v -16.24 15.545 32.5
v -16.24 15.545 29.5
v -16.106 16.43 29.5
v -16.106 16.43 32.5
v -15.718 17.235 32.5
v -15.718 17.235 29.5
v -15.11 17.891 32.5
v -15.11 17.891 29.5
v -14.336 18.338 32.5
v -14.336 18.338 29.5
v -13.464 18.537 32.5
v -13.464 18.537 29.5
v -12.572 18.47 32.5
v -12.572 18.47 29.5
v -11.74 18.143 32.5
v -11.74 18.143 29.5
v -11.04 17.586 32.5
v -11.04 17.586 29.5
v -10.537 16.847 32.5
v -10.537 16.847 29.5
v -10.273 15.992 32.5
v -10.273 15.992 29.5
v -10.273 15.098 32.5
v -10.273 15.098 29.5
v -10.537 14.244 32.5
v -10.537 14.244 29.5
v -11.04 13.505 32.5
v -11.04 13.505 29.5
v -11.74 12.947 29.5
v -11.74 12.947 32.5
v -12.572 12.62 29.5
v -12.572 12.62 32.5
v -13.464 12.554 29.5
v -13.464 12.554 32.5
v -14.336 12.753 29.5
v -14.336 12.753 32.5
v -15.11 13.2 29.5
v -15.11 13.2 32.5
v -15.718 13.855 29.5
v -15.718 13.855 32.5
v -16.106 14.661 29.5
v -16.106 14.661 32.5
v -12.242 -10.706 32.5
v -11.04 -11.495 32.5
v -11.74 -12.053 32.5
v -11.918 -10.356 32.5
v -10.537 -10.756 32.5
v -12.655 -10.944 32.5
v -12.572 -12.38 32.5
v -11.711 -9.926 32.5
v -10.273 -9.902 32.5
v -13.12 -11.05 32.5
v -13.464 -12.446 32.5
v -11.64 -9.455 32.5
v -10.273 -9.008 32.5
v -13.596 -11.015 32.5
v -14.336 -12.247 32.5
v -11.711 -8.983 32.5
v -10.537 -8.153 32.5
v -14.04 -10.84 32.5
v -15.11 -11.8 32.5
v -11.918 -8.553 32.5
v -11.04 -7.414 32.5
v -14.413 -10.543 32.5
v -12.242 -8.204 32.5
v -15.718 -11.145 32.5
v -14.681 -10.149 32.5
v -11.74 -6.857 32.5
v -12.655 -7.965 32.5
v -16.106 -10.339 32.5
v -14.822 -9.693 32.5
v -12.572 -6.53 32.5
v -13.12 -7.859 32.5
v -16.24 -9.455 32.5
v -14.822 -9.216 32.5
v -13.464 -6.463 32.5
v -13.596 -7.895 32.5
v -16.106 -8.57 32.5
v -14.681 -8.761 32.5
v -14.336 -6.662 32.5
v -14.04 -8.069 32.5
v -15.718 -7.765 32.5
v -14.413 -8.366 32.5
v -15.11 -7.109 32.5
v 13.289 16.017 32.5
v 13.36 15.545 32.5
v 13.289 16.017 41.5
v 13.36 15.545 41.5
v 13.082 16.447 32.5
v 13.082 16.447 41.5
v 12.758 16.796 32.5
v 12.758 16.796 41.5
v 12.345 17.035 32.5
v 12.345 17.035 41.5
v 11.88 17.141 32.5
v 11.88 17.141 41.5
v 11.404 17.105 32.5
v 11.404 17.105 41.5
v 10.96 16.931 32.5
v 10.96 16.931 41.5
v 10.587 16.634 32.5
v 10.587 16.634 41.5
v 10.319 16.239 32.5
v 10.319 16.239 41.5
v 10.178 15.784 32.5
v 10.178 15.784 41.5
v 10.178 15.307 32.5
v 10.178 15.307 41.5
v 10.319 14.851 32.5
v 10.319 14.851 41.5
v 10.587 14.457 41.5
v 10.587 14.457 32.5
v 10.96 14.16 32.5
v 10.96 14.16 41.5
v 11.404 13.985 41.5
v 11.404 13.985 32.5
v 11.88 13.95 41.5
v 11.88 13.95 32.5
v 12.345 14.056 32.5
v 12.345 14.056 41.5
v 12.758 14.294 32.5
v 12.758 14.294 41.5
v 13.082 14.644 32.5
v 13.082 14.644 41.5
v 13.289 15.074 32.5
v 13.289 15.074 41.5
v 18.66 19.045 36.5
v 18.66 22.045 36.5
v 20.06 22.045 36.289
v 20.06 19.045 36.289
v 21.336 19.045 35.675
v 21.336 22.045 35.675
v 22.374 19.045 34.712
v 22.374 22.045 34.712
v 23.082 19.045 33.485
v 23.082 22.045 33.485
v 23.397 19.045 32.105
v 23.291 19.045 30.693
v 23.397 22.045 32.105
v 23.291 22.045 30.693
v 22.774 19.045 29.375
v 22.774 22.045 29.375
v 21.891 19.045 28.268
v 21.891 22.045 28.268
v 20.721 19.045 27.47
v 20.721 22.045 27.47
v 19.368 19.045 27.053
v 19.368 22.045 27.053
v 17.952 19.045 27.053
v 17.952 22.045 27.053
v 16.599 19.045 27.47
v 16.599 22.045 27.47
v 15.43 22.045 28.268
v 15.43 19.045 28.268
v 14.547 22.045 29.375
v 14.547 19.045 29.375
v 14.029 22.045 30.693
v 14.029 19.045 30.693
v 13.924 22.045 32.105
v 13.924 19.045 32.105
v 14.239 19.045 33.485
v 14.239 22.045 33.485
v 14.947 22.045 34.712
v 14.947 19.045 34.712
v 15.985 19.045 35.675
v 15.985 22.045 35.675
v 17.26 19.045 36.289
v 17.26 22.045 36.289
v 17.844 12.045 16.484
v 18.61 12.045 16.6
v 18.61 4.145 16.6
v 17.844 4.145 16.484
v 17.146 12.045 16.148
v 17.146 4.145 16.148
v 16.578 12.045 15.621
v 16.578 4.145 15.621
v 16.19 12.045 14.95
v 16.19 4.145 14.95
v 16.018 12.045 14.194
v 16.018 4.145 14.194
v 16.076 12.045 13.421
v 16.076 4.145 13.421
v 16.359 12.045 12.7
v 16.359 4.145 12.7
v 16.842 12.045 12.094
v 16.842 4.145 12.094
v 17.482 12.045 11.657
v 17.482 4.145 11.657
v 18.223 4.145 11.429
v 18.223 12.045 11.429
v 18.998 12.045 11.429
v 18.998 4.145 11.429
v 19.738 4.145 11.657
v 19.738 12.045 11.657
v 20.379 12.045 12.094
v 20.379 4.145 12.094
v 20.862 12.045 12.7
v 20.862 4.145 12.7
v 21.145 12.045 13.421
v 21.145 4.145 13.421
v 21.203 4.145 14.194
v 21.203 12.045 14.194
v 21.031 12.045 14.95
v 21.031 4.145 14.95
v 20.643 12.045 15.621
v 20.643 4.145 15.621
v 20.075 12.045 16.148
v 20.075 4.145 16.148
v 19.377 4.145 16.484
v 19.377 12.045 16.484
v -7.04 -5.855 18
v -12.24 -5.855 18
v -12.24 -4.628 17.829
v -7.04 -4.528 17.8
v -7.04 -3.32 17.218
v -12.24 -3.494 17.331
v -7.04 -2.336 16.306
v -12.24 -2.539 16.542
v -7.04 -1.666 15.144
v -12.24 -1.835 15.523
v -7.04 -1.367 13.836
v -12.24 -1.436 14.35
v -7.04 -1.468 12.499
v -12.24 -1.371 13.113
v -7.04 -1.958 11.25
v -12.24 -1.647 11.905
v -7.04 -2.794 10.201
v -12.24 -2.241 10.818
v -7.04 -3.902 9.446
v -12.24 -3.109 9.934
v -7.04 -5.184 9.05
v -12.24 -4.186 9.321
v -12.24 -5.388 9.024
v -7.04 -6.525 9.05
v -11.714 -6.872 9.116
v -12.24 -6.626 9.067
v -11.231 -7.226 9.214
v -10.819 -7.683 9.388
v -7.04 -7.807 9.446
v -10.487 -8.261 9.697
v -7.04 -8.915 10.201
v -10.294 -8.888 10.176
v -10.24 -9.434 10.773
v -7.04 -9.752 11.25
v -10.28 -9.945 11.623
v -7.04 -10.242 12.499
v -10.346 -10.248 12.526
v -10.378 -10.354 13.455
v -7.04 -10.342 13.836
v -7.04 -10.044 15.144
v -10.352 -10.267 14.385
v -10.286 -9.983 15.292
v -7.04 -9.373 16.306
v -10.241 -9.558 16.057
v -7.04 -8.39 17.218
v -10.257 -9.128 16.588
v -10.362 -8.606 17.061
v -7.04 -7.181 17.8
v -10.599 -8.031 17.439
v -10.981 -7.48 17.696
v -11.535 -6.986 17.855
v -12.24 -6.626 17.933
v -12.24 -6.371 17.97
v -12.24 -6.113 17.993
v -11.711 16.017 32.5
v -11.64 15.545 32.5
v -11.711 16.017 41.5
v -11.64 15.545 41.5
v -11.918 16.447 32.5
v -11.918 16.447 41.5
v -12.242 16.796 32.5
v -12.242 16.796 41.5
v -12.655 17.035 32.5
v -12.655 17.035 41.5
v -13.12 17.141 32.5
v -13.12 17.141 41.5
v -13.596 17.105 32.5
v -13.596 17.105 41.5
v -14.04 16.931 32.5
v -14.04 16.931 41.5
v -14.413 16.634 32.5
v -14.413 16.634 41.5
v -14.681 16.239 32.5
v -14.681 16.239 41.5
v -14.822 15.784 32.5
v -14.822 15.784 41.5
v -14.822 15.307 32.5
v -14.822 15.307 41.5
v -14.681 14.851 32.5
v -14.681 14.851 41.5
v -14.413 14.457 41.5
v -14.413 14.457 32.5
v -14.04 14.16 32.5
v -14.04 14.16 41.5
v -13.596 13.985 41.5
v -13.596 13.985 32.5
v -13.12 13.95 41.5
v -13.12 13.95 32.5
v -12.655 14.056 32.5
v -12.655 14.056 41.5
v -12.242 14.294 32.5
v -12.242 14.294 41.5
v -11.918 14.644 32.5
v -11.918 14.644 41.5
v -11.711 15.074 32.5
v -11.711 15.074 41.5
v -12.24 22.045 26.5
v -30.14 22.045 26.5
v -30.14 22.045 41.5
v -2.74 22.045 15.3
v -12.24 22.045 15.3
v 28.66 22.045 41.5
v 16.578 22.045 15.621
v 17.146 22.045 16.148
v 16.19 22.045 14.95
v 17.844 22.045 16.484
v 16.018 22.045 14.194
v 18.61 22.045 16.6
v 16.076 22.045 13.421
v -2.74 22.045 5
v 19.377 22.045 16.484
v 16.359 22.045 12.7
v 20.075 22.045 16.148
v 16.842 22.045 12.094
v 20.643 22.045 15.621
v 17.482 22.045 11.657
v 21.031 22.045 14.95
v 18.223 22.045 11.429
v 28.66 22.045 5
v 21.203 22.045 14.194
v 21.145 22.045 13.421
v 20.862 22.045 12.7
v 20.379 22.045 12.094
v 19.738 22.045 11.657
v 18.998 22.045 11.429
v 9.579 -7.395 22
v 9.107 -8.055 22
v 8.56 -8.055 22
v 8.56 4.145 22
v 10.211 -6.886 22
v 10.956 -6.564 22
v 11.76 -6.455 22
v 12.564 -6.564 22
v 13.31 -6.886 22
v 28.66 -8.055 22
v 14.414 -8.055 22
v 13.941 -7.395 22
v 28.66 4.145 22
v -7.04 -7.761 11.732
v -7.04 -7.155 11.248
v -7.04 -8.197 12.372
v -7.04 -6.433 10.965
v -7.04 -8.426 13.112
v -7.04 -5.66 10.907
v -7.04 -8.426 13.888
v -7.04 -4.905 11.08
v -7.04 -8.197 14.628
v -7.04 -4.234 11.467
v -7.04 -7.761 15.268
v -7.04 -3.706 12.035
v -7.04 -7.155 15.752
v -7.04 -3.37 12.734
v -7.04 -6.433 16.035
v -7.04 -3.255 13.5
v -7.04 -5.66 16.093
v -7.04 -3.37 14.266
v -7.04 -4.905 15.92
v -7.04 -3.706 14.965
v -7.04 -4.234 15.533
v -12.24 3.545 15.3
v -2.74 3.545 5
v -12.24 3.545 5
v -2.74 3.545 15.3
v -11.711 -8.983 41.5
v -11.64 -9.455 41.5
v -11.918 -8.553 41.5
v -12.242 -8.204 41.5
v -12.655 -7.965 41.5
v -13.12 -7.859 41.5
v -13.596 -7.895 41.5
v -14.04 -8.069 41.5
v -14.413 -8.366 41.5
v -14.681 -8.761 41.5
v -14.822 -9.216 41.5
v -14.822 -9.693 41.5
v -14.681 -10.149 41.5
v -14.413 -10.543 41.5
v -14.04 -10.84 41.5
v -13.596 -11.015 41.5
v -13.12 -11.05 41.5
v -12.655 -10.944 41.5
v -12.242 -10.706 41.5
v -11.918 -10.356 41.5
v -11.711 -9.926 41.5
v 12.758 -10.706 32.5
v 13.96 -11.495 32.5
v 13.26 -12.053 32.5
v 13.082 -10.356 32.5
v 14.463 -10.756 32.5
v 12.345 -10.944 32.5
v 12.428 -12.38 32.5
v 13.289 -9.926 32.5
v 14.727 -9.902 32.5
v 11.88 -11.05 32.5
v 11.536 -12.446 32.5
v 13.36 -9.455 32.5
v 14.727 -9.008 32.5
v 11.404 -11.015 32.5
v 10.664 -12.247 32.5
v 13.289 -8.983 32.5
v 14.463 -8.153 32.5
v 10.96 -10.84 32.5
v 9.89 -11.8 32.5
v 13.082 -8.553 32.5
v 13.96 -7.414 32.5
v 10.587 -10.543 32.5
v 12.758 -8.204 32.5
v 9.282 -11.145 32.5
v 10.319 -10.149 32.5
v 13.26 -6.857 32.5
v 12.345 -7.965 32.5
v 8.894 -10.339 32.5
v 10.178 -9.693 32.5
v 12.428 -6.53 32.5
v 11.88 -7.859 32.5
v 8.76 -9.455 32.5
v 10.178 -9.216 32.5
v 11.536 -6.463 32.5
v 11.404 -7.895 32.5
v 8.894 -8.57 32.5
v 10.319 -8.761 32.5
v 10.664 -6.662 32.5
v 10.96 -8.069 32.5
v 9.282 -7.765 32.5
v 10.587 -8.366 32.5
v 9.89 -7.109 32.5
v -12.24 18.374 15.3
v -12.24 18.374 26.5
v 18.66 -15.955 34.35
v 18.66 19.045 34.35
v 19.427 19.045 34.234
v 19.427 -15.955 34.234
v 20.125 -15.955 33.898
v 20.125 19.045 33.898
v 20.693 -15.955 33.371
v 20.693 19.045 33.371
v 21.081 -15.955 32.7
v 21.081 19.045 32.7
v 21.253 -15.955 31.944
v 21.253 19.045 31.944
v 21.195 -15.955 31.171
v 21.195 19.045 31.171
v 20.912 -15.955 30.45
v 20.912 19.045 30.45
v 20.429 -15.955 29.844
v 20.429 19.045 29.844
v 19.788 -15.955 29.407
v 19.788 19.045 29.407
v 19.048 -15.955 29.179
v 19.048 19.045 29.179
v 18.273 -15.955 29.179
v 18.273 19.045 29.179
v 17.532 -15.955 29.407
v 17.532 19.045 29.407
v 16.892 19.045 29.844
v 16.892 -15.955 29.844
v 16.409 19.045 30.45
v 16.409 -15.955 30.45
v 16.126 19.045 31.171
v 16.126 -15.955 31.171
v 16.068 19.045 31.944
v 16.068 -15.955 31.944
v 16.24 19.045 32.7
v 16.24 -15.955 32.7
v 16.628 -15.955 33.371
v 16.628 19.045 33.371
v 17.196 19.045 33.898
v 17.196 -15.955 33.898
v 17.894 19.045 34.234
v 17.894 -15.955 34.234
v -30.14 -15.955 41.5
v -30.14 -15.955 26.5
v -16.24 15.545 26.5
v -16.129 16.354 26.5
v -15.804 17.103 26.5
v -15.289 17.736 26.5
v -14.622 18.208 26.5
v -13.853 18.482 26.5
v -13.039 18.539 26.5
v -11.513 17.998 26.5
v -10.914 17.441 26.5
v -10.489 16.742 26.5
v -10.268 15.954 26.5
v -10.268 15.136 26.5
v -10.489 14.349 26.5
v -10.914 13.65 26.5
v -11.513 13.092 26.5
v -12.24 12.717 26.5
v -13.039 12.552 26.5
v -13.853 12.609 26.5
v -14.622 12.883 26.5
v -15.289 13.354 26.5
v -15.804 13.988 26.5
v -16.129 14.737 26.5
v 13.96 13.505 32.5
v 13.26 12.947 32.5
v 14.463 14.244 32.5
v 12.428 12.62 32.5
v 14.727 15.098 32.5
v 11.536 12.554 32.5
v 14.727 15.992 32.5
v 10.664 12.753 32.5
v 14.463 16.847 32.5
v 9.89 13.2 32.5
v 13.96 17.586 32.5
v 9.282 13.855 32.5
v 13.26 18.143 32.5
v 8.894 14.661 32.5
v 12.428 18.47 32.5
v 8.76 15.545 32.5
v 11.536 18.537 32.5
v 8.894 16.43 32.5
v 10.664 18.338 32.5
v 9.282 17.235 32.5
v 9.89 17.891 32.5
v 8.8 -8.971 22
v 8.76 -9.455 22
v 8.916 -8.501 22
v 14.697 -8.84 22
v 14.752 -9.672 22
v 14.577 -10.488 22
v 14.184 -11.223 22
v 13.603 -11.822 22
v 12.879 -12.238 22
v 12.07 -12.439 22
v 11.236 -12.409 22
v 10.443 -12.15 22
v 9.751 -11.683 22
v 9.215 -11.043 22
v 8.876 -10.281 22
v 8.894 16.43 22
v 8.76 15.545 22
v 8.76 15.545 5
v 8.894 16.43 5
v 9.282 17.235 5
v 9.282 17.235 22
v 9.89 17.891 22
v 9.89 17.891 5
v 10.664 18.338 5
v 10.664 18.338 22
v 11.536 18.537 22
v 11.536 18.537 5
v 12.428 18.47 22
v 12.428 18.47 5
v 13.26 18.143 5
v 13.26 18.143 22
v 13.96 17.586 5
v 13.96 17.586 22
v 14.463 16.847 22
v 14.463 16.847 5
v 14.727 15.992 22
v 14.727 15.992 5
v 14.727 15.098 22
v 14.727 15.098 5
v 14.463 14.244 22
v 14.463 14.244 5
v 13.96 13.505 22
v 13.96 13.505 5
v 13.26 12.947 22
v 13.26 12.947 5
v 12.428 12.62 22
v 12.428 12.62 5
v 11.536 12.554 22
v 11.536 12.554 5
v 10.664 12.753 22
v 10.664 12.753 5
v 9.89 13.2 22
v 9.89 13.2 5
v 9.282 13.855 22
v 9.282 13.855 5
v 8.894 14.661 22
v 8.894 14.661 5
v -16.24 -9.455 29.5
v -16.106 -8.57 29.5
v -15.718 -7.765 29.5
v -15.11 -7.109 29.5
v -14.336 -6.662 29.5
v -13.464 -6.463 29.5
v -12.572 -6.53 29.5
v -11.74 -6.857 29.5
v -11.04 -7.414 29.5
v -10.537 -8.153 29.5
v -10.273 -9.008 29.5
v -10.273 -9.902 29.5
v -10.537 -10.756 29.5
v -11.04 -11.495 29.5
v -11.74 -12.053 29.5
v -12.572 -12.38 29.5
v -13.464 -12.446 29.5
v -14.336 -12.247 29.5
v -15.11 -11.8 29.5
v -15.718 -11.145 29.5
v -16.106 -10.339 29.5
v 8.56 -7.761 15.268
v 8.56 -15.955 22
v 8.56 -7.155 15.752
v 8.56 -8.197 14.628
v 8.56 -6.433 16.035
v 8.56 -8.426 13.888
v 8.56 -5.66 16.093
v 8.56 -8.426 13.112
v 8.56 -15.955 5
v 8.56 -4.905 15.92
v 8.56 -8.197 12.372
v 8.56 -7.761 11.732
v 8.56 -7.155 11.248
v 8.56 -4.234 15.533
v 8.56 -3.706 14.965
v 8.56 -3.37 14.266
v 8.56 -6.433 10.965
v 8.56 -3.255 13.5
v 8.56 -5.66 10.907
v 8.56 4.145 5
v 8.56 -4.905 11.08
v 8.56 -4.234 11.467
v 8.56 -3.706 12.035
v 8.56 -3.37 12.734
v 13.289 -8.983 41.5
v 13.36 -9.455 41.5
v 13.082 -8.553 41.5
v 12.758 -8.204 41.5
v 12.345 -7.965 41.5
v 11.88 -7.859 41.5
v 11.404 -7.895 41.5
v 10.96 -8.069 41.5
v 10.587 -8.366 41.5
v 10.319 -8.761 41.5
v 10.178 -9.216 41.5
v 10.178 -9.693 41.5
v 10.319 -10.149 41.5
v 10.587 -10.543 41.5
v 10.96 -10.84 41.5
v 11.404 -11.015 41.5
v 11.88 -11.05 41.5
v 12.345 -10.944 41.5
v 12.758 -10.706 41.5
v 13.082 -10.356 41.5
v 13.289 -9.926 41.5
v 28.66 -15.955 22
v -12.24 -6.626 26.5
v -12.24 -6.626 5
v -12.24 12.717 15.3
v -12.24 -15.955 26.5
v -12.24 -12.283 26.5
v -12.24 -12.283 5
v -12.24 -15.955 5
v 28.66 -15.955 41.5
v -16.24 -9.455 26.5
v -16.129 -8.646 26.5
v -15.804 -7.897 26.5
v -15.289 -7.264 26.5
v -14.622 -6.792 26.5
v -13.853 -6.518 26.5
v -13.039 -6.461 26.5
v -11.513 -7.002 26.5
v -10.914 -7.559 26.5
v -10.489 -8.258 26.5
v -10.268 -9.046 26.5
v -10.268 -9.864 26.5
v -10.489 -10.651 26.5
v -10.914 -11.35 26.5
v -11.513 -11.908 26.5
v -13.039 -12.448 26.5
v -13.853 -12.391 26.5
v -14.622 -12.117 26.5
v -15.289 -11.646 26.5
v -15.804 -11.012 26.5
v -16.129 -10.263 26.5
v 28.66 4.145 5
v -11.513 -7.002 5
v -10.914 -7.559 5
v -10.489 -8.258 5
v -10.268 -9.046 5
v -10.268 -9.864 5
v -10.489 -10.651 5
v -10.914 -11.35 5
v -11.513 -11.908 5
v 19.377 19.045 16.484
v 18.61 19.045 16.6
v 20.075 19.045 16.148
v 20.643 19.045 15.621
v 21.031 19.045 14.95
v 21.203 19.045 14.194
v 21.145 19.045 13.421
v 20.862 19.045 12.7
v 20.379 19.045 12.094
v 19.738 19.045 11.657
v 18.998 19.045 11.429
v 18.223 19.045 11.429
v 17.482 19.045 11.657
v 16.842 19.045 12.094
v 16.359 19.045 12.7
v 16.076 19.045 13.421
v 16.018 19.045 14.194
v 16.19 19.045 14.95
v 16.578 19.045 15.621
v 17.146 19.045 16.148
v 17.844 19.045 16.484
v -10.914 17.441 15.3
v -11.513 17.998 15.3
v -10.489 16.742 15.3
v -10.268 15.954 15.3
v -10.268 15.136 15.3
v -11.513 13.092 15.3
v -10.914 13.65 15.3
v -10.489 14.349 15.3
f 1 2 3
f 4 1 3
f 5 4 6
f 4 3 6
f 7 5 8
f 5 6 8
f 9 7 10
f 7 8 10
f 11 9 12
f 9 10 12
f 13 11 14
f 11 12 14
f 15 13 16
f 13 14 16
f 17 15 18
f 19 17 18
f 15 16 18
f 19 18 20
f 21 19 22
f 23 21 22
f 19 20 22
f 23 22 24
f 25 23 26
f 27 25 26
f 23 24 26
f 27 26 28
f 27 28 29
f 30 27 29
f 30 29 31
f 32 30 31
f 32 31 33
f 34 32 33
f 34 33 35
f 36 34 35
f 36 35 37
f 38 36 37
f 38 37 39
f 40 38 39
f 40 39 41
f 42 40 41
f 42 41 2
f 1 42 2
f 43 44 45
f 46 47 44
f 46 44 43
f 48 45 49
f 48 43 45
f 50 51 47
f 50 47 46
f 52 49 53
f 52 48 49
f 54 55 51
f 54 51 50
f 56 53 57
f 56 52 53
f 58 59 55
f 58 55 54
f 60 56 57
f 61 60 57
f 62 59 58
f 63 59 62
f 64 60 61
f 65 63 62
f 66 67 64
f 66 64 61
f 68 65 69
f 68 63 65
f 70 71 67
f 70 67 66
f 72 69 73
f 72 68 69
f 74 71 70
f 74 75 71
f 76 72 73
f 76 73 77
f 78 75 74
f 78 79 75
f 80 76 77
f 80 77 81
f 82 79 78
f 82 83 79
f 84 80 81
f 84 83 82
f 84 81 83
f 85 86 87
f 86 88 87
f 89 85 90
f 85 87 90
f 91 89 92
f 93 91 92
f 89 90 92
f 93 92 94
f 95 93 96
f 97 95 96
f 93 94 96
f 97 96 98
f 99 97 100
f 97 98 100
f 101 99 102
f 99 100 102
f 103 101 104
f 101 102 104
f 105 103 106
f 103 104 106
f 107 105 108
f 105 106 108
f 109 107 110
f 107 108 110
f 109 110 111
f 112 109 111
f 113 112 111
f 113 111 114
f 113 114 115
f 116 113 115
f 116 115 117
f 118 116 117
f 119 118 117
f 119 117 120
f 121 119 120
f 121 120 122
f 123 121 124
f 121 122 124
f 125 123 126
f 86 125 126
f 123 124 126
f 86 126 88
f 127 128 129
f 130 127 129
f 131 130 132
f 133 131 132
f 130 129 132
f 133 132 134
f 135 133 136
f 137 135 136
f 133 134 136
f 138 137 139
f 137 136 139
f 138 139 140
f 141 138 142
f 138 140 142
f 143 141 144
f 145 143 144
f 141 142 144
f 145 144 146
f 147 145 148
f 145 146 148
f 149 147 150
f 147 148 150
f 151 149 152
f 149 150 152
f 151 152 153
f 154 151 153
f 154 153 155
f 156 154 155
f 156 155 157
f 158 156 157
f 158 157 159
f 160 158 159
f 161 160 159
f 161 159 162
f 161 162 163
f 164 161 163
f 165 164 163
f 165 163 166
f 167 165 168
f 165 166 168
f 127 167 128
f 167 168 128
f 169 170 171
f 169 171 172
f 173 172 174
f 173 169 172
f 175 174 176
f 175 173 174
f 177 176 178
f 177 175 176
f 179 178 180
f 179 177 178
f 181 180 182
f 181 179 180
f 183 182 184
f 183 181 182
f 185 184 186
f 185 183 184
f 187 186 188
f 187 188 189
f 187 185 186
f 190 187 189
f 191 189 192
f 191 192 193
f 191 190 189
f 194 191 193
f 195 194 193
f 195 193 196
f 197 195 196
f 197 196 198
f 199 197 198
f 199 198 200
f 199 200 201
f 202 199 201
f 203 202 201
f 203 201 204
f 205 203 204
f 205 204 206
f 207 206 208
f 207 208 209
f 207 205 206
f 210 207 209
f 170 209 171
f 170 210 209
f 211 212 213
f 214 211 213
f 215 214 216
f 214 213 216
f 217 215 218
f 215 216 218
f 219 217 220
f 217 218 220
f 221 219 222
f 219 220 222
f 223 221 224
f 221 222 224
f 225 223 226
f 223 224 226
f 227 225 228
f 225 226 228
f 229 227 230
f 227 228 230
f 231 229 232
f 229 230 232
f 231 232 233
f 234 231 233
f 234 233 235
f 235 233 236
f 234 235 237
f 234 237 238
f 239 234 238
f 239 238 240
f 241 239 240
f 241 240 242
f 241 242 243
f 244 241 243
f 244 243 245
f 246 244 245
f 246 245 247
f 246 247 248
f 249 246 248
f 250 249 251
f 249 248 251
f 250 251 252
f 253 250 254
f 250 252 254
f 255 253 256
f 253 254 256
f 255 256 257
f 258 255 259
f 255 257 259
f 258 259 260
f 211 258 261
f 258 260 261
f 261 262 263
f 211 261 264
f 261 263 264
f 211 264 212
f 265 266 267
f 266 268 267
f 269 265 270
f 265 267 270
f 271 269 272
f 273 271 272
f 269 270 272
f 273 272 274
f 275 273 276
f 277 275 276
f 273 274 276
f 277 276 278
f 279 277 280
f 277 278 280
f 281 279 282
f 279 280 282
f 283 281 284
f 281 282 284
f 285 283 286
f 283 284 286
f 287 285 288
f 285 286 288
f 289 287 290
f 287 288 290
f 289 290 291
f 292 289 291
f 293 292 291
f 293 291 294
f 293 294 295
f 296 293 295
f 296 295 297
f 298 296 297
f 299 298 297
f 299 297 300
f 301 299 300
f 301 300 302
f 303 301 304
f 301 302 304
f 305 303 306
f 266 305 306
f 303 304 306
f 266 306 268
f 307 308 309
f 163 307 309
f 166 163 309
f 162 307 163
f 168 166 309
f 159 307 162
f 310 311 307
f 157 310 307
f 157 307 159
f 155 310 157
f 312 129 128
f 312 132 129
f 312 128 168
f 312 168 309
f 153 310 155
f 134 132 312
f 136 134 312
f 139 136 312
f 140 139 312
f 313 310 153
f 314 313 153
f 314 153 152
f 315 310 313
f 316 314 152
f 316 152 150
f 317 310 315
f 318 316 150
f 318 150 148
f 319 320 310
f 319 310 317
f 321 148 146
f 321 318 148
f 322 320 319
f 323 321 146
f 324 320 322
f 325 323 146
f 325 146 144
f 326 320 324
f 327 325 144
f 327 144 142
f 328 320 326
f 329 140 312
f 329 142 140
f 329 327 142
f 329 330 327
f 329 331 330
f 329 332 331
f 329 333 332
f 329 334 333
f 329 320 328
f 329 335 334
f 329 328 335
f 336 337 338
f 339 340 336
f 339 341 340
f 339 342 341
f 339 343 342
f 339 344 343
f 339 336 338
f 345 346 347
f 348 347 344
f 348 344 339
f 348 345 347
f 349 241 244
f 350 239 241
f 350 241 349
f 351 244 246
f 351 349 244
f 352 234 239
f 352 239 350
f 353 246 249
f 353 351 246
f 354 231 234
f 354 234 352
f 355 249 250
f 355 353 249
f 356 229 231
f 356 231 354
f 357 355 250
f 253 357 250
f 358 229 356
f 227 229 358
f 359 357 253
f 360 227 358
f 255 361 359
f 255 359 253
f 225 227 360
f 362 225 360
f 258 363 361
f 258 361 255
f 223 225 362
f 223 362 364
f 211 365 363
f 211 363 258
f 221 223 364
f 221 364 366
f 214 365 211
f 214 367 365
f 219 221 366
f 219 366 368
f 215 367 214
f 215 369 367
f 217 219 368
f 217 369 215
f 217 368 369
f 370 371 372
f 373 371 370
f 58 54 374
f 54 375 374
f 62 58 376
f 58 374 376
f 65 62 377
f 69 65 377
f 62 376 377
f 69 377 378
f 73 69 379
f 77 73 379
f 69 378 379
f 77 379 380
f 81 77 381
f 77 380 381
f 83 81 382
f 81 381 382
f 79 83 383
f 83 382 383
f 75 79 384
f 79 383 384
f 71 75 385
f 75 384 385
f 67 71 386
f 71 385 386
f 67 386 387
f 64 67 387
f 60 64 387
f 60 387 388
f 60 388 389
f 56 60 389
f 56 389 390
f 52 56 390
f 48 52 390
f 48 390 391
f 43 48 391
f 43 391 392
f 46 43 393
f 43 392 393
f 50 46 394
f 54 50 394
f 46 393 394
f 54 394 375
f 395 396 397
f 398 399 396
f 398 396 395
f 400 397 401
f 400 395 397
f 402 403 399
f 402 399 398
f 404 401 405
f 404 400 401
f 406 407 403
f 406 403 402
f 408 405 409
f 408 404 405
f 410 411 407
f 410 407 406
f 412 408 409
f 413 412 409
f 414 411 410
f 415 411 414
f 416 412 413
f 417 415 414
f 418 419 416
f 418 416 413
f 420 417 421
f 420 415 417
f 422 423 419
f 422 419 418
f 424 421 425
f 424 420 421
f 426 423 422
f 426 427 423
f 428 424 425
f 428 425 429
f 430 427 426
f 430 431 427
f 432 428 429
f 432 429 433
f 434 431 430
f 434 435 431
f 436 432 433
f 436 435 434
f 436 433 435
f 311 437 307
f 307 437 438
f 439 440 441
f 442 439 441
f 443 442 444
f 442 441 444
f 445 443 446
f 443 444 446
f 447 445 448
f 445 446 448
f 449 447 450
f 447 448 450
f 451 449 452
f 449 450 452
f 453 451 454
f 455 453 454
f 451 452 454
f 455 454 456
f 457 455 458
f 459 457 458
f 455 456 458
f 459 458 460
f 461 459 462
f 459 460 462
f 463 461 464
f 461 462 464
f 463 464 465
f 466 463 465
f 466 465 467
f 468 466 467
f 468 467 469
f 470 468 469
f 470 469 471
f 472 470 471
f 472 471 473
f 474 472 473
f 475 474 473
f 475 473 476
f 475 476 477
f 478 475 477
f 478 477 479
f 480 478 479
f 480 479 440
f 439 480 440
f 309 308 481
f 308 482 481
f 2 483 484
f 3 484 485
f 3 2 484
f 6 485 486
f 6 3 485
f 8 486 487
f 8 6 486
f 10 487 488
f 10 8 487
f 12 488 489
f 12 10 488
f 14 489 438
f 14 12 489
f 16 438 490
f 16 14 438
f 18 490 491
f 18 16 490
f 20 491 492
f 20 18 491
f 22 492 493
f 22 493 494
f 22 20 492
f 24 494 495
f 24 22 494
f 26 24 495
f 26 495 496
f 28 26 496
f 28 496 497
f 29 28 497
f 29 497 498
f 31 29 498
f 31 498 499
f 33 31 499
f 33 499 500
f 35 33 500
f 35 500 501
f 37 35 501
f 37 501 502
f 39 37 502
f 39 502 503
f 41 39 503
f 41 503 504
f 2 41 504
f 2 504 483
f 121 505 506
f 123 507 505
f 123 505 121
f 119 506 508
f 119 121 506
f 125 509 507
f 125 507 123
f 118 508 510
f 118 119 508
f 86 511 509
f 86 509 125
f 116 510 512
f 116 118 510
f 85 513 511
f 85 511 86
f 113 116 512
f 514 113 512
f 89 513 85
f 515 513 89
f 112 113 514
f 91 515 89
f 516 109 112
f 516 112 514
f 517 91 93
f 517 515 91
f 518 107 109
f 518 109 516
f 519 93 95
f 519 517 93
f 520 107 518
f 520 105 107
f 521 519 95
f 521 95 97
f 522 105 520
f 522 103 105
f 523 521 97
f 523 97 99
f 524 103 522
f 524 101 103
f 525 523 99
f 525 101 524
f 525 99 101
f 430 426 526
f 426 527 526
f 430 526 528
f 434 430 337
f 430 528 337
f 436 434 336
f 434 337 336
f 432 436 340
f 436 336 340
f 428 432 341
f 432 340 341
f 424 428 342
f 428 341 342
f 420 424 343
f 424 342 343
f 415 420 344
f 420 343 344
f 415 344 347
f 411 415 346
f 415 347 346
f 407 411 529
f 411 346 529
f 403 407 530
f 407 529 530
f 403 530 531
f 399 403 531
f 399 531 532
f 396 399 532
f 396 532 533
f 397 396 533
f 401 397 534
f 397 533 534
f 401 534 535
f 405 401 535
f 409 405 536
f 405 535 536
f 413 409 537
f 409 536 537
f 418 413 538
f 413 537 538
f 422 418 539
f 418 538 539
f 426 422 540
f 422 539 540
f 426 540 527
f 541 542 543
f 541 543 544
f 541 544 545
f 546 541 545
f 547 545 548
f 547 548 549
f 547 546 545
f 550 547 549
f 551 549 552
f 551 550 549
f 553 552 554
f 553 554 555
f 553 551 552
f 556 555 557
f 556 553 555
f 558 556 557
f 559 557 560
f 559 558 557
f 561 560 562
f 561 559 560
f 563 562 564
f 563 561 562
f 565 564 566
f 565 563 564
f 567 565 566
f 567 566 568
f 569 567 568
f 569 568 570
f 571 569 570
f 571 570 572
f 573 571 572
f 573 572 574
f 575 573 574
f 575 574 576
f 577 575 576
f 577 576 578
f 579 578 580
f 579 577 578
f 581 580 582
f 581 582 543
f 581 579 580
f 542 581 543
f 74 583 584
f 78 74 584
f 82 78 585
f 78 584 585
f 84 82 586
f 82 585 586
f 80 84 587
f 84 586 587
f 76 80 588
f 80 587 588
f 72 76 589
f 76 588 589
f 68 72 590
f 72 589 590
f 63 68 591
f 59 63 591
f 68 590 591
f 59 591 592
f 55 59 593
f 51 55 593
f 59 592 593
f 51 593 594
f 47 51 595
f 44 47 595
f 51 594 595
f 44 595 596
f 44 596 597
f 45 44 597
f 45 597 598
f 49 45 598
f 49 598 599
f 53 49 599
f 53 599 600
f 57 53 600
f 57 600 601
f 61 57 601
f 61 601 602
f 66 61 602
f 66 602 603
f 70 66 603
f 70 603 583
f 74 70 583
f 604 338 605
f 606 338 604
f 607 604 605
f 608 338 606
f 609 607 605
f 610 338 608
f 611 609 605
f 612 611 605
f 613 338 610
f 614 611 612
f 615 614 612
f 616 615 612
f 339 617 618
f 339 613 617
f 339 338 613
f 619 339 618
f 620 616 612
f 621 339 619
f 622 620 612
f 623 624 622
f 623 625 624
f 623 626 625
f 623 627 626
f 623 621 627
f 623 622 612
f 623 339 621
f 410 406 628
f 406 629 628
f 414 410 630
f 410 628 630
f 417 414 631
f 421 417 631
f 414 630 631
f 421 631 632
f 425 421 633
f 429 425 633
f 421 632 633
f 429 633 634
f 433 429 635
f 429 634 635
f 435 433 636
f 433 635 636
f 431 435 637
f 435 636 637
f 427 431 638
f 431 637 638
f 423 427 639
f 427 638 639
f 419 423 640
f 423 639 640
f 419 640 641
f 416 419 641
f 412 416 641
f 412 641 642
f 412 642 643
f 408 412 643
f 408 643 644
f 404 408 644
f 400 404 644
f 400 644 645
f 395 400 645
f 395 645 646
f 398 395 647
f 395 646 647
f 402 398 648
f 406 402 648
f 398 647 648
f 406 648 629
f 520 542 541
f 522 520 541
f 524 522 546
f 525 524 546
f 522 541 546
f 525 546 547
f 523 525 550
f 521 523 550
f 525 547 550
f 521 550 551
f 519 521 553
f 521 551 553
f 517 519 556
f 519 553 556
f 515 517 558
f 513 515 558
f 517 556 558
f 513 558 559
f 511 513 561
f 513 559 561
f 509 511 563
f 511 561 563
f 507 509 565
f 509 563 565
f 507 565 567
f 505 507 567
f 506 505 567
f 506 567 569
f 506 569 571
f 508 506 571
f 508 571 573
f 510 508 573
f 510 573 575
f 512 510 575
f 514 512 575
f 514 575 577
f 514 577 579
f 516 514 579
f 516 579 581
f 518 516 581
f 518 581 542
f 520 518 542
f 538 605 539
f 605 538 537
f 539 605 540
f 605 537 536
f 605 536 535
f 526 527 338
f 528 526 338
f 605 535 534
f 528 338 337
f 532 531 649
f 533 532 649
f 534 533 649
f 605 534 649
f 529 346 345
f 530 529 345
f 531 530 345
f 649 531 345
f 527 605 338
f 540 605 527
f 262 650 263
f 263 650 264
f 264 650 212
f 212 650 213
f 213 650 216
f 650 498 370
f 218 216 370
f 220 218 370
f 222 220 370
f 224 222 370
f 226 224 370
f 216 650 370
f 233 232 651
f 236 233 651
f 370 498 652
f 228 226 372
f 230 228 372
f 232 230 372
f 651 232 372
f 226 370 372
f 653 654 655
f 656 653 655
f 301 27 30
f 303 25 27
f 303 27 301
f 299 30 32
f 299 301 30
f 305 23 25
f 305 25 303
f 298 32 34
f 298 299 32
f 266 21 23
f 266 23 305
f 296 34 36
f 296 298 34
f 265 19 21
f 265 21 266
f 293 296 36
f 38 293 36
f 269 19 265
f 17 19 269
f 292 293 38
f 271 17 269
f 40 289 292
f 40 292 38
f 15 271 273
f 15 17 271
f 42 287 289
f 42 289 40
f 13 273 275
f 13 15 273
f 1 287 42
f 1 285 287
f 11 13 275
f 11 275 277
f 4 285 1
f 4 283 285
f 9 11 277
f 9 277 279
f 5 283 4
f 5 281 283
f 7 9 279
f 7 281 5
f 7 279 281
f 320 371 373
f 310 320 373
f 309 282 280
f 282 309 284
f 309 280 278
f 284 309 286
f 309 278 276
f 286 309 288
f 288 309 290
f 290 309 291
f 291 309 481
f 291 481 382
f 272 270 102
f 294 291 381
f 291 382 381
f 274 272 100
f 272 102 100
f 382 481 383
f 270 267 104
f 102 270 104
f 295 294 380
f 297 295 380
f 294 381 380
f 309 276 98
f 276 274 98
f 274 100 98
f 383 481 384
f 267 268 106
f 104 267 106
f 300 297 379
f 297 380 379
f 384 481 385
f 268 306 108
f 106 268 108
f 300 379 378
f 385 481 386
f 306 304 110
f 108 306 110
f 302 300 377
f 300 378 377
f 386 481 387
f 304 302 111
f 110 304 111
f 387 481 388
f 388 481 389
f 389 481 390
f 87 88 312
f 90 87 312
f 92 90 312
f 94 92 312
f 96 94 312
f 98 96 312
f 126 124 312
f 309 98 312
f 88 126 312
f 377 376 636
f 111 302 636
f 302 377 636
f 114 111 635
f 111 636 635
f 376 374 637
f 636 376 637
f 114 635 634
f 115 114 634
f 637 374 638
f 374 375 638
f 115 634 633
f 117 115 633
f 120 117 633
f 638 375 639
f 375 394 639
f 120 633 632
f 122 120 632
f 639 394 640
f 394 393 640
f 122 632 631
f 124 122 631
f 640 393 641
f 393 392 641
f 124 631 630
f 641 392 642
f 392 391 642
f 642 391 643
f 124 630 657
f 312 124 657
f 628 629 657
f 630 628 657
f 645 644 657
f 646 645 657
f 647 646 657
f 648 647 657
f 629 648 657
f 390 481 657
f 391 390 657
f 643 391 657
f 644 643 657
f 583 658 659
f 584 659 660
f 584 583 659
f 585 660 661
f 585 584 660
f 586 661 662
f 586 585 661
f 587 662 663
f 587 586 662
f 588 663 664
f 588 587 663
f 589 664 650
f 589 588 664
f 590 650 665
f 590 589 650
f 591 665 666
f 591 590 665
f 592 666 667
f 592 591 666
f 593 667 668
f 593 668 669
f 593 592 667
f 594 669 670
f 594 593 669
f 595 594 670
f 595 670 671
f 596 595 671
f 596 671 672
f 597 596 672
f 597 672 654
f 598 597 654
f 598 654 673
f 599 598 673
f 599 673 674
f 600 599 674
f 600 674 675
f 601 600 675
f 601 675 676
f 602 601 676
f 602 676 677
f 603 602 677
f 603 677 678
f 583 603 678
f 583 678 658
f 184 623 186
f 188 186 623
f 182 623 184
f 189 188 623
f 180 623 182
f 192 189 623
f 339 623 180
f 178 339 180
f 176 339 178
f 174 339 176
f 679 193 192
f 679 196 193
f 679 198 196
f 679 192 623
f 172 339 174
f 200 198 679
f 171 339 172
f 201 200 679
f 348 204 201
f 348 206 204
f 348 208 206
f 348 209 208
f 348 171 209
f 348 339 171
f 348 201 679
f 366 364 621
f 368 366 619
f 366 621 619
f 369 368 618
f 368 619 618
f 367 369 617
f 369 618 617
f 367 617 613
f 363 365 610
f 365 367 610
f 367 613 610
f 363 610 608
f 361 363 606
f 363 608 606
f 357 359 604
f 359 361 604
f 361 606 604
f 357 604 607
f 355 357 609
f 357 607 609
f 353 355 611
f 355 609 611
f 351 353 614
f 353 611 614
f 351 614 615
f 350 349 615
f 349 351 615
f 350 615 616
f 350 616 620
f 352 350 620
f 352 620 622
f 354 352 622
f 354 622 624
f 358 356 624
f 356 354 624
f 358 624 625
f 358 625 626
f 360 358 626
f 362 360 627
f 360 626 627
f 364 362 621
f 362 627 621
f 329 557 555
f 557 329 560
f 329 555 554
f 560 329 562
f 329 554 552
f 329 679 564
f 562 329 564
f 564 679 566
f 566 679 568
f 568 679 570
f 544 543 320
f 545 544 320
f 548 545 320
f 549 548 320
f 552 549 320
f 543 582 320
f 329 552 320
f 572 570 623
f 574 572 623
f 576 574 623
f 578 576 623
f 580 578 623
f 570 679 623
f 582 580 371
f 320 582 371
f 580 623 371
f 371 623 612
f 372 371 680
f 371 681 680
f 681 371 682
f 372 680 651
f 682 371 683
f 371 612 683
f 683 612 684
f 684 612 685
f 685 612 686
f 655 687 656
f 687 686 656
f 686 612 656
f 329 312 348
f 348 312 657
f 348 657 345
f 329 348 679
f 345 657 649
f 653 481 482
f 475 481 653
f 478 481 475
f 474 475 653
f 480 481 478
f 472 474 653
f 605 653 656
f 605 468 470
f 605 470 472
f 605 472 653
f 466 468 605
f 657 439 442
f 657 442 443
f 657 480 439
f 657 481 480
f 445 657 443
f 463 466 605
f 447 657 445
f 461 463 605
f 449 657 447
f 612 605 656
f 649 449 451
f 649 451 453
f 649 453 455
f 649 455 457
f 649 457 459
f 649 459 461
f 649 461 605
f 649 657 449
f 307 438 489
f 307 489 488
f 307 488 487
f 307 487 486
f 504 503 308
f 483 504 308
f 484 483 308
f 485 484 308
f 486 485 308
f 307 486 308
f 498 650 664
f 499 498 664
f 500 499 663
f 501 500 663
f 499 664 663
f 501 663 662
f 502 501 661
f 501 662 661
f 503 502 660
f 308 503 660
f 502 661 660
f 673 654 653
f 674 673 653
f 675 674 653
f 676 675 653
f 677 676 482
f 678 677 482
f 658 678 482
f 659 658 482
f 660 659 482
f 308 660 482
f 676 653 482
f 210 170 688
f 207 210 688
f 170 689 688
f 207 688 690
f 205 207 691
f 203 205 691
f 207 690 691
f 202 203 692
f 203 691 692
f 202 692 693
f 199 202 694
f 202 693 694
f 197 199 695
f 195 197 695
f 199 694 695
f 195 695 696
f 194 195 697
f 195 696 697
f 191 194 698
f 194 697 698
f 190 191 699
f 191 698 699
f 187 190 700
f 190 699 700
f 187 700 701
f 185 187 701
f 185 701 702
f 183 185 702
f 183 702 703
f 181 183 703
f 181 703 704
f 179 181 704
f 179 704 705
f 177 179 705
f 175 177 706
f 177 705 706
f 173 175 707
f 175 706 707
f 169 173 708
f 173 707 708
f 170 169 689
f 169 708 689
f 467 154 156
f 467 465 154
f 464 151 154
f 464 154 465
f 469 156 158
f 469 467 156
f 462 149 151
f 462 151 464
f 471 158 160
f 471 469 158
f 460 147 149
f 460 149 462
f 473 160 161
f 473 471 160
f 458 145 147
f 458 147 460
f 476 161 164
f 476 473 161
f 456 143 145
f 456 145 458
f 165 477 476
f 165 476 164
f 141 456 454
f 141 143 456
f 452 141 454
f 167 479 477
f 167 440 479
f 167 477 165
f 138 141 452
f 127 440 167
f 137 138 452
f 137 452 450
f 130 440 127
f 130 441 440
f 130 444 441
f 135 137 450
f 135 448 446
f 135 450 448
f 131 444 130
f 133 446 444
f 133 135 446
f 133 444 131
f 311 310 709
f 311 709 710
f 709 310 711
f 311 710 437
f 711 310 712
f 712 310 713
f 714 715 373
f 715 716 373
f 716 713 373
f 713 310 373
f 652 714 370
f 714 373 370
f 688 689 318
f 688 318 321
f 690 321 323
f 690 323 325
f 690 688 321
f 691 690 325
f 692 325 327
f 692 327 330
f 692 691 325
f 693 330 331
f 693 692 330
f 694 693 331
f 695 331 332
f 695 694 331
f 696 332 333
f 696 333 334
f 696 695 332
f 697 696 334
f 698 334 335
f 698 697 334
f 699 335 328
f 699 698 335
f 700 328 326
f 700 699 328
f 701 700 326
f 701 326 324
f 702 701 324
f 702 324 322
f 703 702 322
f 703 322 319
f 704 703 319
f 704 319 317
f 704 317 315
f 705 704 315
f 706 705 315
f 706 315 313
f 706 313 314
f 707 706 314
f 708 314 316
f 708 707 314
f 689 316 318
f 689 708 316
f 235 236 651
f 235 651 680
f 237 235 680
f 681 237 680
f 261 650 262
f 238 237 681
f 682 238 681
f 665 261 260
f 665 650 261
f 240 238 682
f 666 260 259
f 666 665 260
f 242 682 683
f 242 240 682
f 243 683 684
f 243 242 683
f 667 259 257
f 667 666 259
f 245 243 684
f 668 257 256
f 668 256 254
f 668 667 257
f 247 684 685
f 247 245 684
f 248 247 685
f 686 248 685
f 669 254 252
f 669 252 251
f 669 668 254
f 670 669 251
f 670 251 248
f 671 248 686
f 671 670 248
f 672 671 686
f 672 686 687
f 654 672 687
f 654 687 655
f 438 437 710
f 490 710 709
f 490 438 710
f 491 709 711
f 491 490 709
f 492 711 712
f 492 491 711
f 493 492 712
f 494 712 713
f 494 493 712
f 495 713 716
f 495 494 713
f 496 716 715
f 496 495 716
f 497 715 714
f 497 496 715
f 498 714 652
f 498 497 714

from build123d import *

# Parameters (mm, degrees)
SKETCH_1_W                = 58.8
SKETCH_1_H                = 32
EXTRUDE_1_DEPTH           = 41.5
HOLE_WIZARD_1_D           = 3.2
HOLE_WIZARD_1_CBORE_D     = 6
HOLE_WIZARD_1_CBORE_DEPTH = 32.5
SKETCH_8_R                = 2.6
CUT_EXTRUDE_6_DEPTH       = 33.5
SKETCH_10_W               = 58.8
SKETCH_10_H               = 41.5
EXTRUDE_2_DEPTH           = 3
SKETCH_20_W               = 20
SKETCH_20_H               = 20
SKETCH_20_R               = 3
CUT_EXTRUDE_16_DEPTH      = 22
SKETCH_21_R               = 2.6
CUT_EXTRUDE_17_DEPTH      = 63.093855195
SKETCH_22_W               = 22
SKETCH_22_H               = 20
CUT_EXTRUDE_18_DEPTH      = 0.1
SKETCH_23_W               = 20.1
SKETCH_23_H               = 22
CUT_EXTRUDE_19_DEPTH      = 0.1
SKETCH_24_R               = 2.6
CUT_EXTRUDE_20_DEPTH      = 56.08771962
SKETCH_25_W               = 21.4
SKETCH_25_H               = 23.5
CUT_EXTRUDE_21_DEPTH      = 35
SKETCH_26_W               = 21.4
SKETCH_26_H               = 20
SKETCH_26_R               = 3
CUT_EXTRUDE_22_DEPTH      = 27
SKETCH_27_R               = 3
EXTRUDE_3_DEPTH           = 6
CHAMFER_1_SIZE            = 10
FILLET_1_R                = 5
CUT_EXTRUDE_30_DEPTH      = 5
SKETCH_36_R               = 2.6
CUT_EXTRUDE_31_DEPTH      = 60.855349011
SKETCH_37_R               = 2.6
EXTRUDE_6_DEPTH           = 3
SKETCH_38_W               = 19.040158201
SKETCH_38_H               = 15.764200478
CUT_EXTRUDE_32_DEPTH      = 3
SKETCH_39_W               = 5.883083502
SKETCH_39_H               = 11.158232545
CUT_EXTRUDE_33_DEPTH      = 9
SKETCH_40_W               = 9
SKETCH_40_H               = 11.158232545
CUT_EXTRUDE_34_DEPTH      = 4
CUT_EXTRUDE_35_DEPTH      = 14
CUT_EXTRUDE_37_DEPTH      = 5
CUT_EXTRUDE_38_DEPTH      = 9
SKETCH_44_W               = 27.4
SKETCH_44_H               = 35
SKETCH_44_R               = 3
EXTRUDE_7_DEPTH           = 3
SKETCH_45_R               = 1.5
CUT_EXTRUDE_39_DEPTH      = 6
SKETCH_47_R               = 1.5
CUT_EXTRUDE_41_DEPTH      = 6
SKETCH_48_R               = 2.6
CUT_EXTRUDE_42_DEPTH      = 63.093855195
SKETCH_49_R               = 2.6
EXTRUDE_8_DEPTH           = 35
SKETCH_50_W               = 20.1
SKETCH_50_H               = 17
CUT_EXTRUDE_43_DEPTH      = 7
SKETCH_51_R               = 6.4
EXTRUDE_9_DEPTH           = 5
SKETCH_52_R               = 2.6
EXTRUDE_10_DEPTH          = 6.3
SKETCH_55_W               = 20.1
SKETCH_55_H               = 7
SKETCH_55_R               = 3
EXTRUDE_11_DEPTH          = 17
SKETCH_56_R               = 2.6
CUT_EXTRUDE_46_DEPTH      = 63.093855195
SKETCH_57_W               = 20.1
SKETCH_57_H               = 17
SKETCH_57_R               = 2.6
EXTRUDE_12_DEPTH          = 7.9
SKETCH_58_W               = 20.1
SKETCH_58_H               = 17
CUT_EXTRUDE_47_DEPTH      = 7.9
SKETCH_59_R               = 1.5
EXTRUDE_13_DEPTH          = 6
SKETCH_60_R               = 1.5
EXTRUDE_14_DEPTH          = 11.3
EXTRUDE_15_DEPTH          = 9.5
SKETCH_62_R               = 2.6
CUT_EXTRUDE_48_DEPTH      = 60.855349011
SKETCH_65_R               = 4.5
SKETCH_65_R_2             = 2.6
CUT_EXTRUDE_50_DEPTH      = 5.2
SKETCH_66_R               = 3
CUT_EXTRUDE_51_DEPTH      = 42.633756235
SKETCH_67_R               = 3
CUT_EXTRUDE_52_DEPTH      = 42.633756287
SKETCH_68_R               = 2.6
EXTRUDE_16_DEPTH          = 3
SKETCH_69_R               = 4.75
CUT_EXTRUDE_53_DEPTH      = 3


with BuildPart() as part:
    # 草图1 → 凸台-拉伸1 (new body)
    with BuildSketch(Plane.XY):
        with Locations((-0.739622642, 3.045283019)):
            Rectangle(SKETCH_1_W, SKETCH_1_H)
    extrude(amount=EXTRUDE_1_DEPTH)

    # 孔1 (through all)
    with Locations(Plane(origin=(11.760377358, 15.545283019, 0), x_dir=(-1, 0, 0), z_dir=(0, 0, -1))):
        with Locations((0, 0), (25, 0), (25, -25), (0, -25)):
            CounterBoreHole(HOLE_WIZARD_1_D / 2, HOLE_WIZARD_1_CBORE_D / 2, HOLE_WIZARD_1_CBORE_DEPTH)

    # 草图8 → 切除-拉伸6 (cut)
    with BuildSketch(Plane(origin=(0, 19.045283019, 0), x_dir=(1, 0, 0), z_dir=(0, 1, 0))):
        with Locations(Location((-0.739622642, -31.5, 0), (0, 0, 270))):
            Circle(SKETCH_8_R)
    extrude(amount=-CUT_EXTRUDE_6_DEPTH, mode=Mode.SUBTRACT)

    # 草图10 → 凸台-拉伸2 (add)
    with BuildSketch(Plane.XZ.offset(12.954716981)):
        with Locations((-0.739622642, 20.75)):
            Rectangle(SKETCH_10_W, SKETCH_10_H)
    extrude(amount=EXTRUDE_2_DEPTH)

    # 草图20 → 切除-拉伸16 (cut)
    with BuildSketch(Plane(origin=(0, 0, 0), x_dir=(-1, 0, 0), z_dir=(0, 0, -1))):
        with Locations((-18.660377358, 9.045283019)):
            Rectangle(SKETCH_20_W, SKETCH_20_H)
        with Locations((-11.760377358, 15.545283019)):
            Circle(SKETCH_20_R, mode=Mode.SUBTRACT)
    extrude(amount=-CUT_EXTRUDE_16_DEPTH, mode=Mode.SUBTRACT)

    # 草图21 → 切除-拉伸17 (cut, through all)
    with BuildSketch(Plane(origin=(0, 19.045283019, 0), x_dir=(1, 0, 0), z_dir=(0, 1, 0))):
        with Locations(Location((-0.739622642, -31.5, 0), (0, 0, 270))):
            Circle(SKETCH_21_R)
    extrude(amount=-CUT_EXTRUDE_17_DEPTH, mode=Mode.SUBTRACT)

    # 草图22 → 切除-拉伸18 (cut)
    with BuildSketch(Plane(origin=(8.660377358, 0, 0), x_dir=(0, 0, -1), z_dir=(1, 0, 0))):
        with Locations((-11, 9.045283019)):
            Rectangle(SKETCH_22_W, SKETCH_22_H)
    extrude(amount=-CUT_EXTRUDE_18_DEPTH, mode=Mode.SUBTRACT)

    # 草图23 → 切除-拉伸19 (cut)
    with BuildSketch(Plane(origin=(0, -0.954716981, 0), x_dir=(1, 0, 0), z_dir=(0, 1, 0))):
        with Locations((18.610377358, -11)):
            Rectangle(SKETCH_23_W, SKETCH_23_H)
    extrude(amount=-CUT_EXTRUDE_19_DEPTH, mode=Mode.SUBTRACT)

    # 草图24 → 切除-拉伸20 (cut, through all)
    with BuildSketch(Plane(origin=(0, -1.054716981, 0), x_dir=(1, 0, 0), z_dir=(0, 1, 0))):
        with Locations(Location((18.610377358, -14, 0), (0, 0, 270))):
            Circle(SKETCH_24_R)
    extrude(amount=-CUT_EXTRUDE_20_DEPTH, mode=Mode.SUBTRACT)

    # 草图25 → 切除-拉伸21 (cut)
    with BuildSketch(Plane(origin=(0, 19.045283019, 0), x_dir=(1, 0, 0), z_dir=(0, 1, 0))):
        with Locations((-19.439622642, -17.75)):
            Rectangle(SKETCH_25_W, SKETCH_25_H)
    extrude(amount=-CUT_EXTRUDE_21_DEPTH, mode=Mode.SUBTRACT)

    # 草图26 → 切除-拉伸22 (cut)
    with BuildSketch(Plane(origin=(0, 0, 0), x_dir=(-1, 0, 0), z_dir=(0, 0, -1))):
        with Locations((19.439622642, -5.954716981)):
            Rectangle(SKETCH_26_W, SKETCH_26_H)
        with Locations((13.239622642, -9.454716981)):
            Circle(SKETCH_26_R, mode=Mode.SUBTRACT)
    extrude(amount=-CUT_EXTRUDE_22_DEPTH, mode=Mode.SUBTRACT)

    # 草图27 → 凸台-拉伸3 (add, through all)
    with BuildSketch(Plane.XY.offset(6)):
        with Locations(Location((-13.239622642, 15.545283019, 0), (0, 0, 180))):
            Circle(SKETCH_27_R)
    extrude(amount=-EXTRUDE_3_DEPTH)

    # 倒角1
    chamfer_1_edges = [part.edges().sort_by_distance(p)[0] for p in [
        (-30.139622642, 19.045283019, 3),
    ]]
    chamfer(chamfer_1_edges, length=CHAMFER_1_SIZE)

    # 圆角1
    fillet_1_edges = [part.edges().sort_by_distance(p)[0] for p in [
        (-30.139622642, 9.045283019, 3),
        (-20.139622642, 19.045283019, 3),
    ]]
    fillet(fillet_1_edges, radius=FILLET_1_R)

    # 草图35 → 切除-拉伸30 (cut)
    with BuildSketch(Plane(origin=(0, 0, 0), x_dir=(-1, 0, 0), z_dir=(0, 0, -1))):
        with BuildLine():
            Line((30.139622642, 4.045283019), (30.139622642, 6.974215207))
            ThreePointArc((30.139622642, 6.974215207), (29.759020304, 8.887632369), (28.675156547, 10.509749113))
            Line((28.675156547, 10.509749113), (21.604088736, 17.580816925))
            ThreePointArc((21.604088736, 17.580816925), (19.981971991, 18.664680681), (18.06855483, 19.045283019))
            Line((18.06855483, 19.045283019), (-8.560377358, 19.045283019))
            Line((-8.560377358, 19.045283019), (-8.560377358, -1.054716981))
            Line((-8.560377358, -1.054716981), (-28.660377358, -1.054716981))
            Line((-28.660377358, -1.054716981), (-28.660377358, -15.954716981))
            Line((-28.660377358, -15.954716981), (8.739622642, -15.954716981))
            Line((8.739622642, -15.954716981), (8.739622642, 4.045283019))
            Line((8.739622642, 4.045283019), (30.139622642, 4.045283019))
        make_face()
    extrude(amount=-CUT_EXTRUDE_30_DEPTH, mode=Mode.SUBTRACT)

    # 草图36 → 切除-拉伸31 (cut, through all)
    with BuildSketch(Plane(origin=(8.560377358, 0, 0), x_dir=(0, 0, -1), z_dir=(1, 0, 0))):
        with Locations(Location((-13.5, 8.995283019, 0), (0, 0, 90))):
            Circle(SKETCH_36_R)
    extrude(amount=-CUT_EXTRUDE_31_DEPTH, mode=Mode.SUBTRACT)

    # 草图37 → 凸台-拉伸6 (add)
    with BuildSketch(Plane.ZY.offset(8.739622642)):
        Polygon((5, 4.045283019), (5, -15.954716981), (29.5, -15.954716981), (29.5, 19.045283019), (6, 19.045283019), (6, 4.045283019), align=None)
        with Locations(Location((13.5, 8.995283019, 0), (0, 0, 90))):
            Circle(SKETCH_37_R, mode=Mode.SUBTRACT)
    extrude(amount=EXTRUDE_6_DEPTH)

    # 草图38 → 切除-拉伸32 (cut)
    with BuildSketch(Plane(origin=(0, 0, 5), x_dir=(-1, 0, 0), z_dir=(0, 0, -1))):
        with Locations((21.259701742, 11.927383258)):
            Rectangle(SKETCH_38_W, SKETCH_38_H)
    extrude(amount=-CUT_EXTRUDE_32_DEPTH, mode=Mode.SUBTRACT)

    # 草图39 → 切除-拉伸33 (cut)
    with BuildSketch(Plane.ZY.offset(11.739622642)):
        with Locations((7.941541751, 13.466166747)):
            Rectangle(SKETCH_39_W, SKETCH_39_H)
    extrude(amount=-CUT_EXTRUDE_33_DEPTH, mode=Mode.SUBTRACT)

    # 草图40 → 切除-拉伸34 (cut)
    with BuildSketch(Plane(origin=(0, 0, 10.883083502), x_dir=(-1, 0, 0), z_dir=(0, 0, -1))):
        with Locations((7.239622642, 13.466166747)):
            Rectangle(SKETCH_40_W, SKETCH_40_H)
    extrude(amount=-CUT_EXTRUDE_34_DEPTH, mode=Mode.SUBTRACT)

    # 草图41 → 切除-拉伸35 (cut)
    with BuildSketch(Plane.ZY.offset(11.739622642)):
        with BuildLine():
            ThreePointArc((16.1, 8.995283019), (15.338477631, 7.156805388), (13.5, 6.395283019))
            ThreePointArc((13.5, 6.395283019), (12.107413309, 6.799673238), (11.148017724, 7.887050474))
            Line((11.148017724, 7.887050474), (7.196681777, 7.887050474))
            ThreePointArc((7.196681777, 7.887050474), (17.925328842, 4.371814122), (14.883083502, 15.244049299))
            Line((14.883083502, 15.244049299), (14.883083502, 11.196891528))
            ThreePointArc((14.883083502, 11.196891528), (15.775523797, 10.253055434), (16.1, 8.995283019))
        make_face()
    extrude(amount=-CUT_EXTRUDE_35_DEPTH, mode=Mode.SUBTRACT)

    # 草图42 → 切除-拉伸37 (cut)
    with BuildSketch(Plane.ZY.offset(2.739622642)):
        with BuildLine():
            ThreePointArc((14.883083502, 15.244049299), (9.074671158, 13.618751916), (7.196681777, 7.887050474))
            Line((7.196681777, 7.887050474), (11.148017724, 7.887050474))
            ThreePointArc((11.148017724, 7.887050474), (11.775629634, 10.941188166), (14.883083502, 11.196891528))
            Line((14.883083502, 11.196891528), (14.883083502, 15.244049299))
        make_face()
    extrude(amount=-CUT_EXTRUDE_37_DEPTH, mode=Mode.SUBTRACT)

    # 草图43 → 切除-拉伸38 (cut)
    with BuildSketch(Plane.ZY.offset(11.739622642)):
        with BuildLine():
            Line((14.883083502, 19.045283019), (14.883083502, 15.244049299))
            ThreePointArc((14.883083502, 15.244049299), (17.925328842, 4.371814122), (7.196681777, 7.887050474))
            Line((7.196681777, 7.887050474), (5, 7.887050474))
            Line((5, 7.887050474), (5, -15.954716981))
            Line((5, -15.954716981), (29.5, -15.954716981))
            Line((29.5, -15.954716981), (29.5, -12.052793192))
            Line((29.5, -12.052793192), (29.5, -6.85664077))
            Line((29.5, -6.85664077), (29.5, 12.947206808))
            Line((29.5, 12.947206808), (29.5, 18.14335923))
            Line((29.5, 18.14335923), (29.5, 19.045283019))
            Line((29.5, 19.045283019), (14.883083502, 19.045283019))
        make_face()
    extrude(amount=-CUT_EXTRUDE_38_DEPTH, mode=Mode.SUBTRACT)

    # 草图44 → 凸台-拉伸7 (add)
    with BuildSketch(Plane(origin=(0, 0, 29.5), x_dir=(-1, 0, 0), z_dir=(0, 0, -1))):
        with Locations((16.439622642, 1.545283019)):
            Rectangle(SKETCH_44_W, SKETCH_44_H)
        with Locations((13.239622642, 15.545283019)):
            Circle(SKETCH_44_R, mode=Mode.SUBTRACT)
        with Locations((13.239622642, -9.454716981)):
            Circle(SKETCH_44_R, mode=Mode.SUBTRACT)
    extrude(amount=EXTRUDE_7_DEPTH)

    # 草图45 → 切除-拉伸39 (cut)
    with BuildSketch(Plane.ZY.offset(2.739622642)):
        with Locations((22, 12.225283019)):
            Circle(SKETCH_45_R)
    extrude(amount=-CUT_EXTRUDE_39_DEPTH, mode=Mode.SUBTRACT)

    # 草图47 → 切除-拉伸41 (cut)
    with BuildSketch(Plane.ZY.offset(2.739622642)):
        with Locations((15.75, -7.954716981)):
            Circle(SKETCH_47_R)
    extrude(amount=-CUT_EXTRUDE_41_DEPTH, mode=Mode.SUBTRACT)

    # 草图48 → 切除-拉伸42 (cut, through all)
    with BuildSketch(Plane(origin=(0, 19.045283019, 0), x_dir=(1, 0, 0), z_dir=(0, 1, 0))):
        with Locations(Location((18.660377358, -31.75, 0), (0, 0, 270))):
            Circle(SKETCH_48_R)
    extrude(amount=-CUT_EXTRUDE_42_DEPTH, mode=Mode.SUBTRACT)

    # 草图49 → 凸台-拉伸8 (add, through all)
    with BuildSketch(Plane(origin=(0, 19.045283019, 0), x_dir=(1, 0, 0), z_dir=(0, 1, 0))):
        with Locations((-0.739622642, -31.5)):
            Circle(SKETCH_49_R)
    extrude(amount=-EXTRUDE_8_DEPTH)

    # 草图50 → 切除-拉伸43 (cut)
    with BuildSketch(Plane(origin=(0, -1.054716981, 0), x_dir=(1, 0, 0), z_dir=(0, 1, 0))):
        with Locations((18.610377358, -13.5)):
            Rectangle(SKETCH_50_W, SKETCH_50_H)
    extrude(amount=-CUT_EXTRUDE_43_DEPTH, mode=Mode.SUBTRACT)

    # 草图51 → 凸台-拉伸9 (add)
    with BuildSketch(Plane.ZY.offset(-2.260377358)):
        with Locations((13.5, 8.995283019)):
            Circle(SKETCH_51_R)
    extrude(amount=EXTRUDE_9_DEPTH)

    # 草图52 → 凸台-拉伸10 (add)
    with BuildSketch(Plane(origin=(2.260377358, 0, 0), x_dir=(0, 0, -1), z_dir=(1, 0, 0))):
        with Locations((-13.5, 8.995283019)):
            Circle(SKETCH_52_R)
    extrude(amount=EXTRUDE_10_DEPTH)

    # 草图55 → 凸台-拉伸11 (add)
    with BuildSketch(Plane(origin=(0, 0, 22), x_dir=(-1, 0, 0), z_dir=(0, 0, -1))):
        with Locations((-18.610377358, 15.545283019)):
            Rectangle(SKETCH_55_W, SKETCH_55_H)
        with Locations((-11.760377358, 15.545283019)):
            Circle(SKETCH_55_R, mode=Mode.SUBTRACT)
    extrude(amount=EXTRUDE_11_DEPTH)

    # 草图56 → 切除-拉伸46 (cut, through all)
    with BuildSketch(Plane(origin=(0, 19.045283019, 0), x_dir=(1, 0, 0), z_dir=(0, 1, 0))):
        with Locations(Location((18.610377358, -14, 0), (0, 0, 270))):
            Circle(SKETCH_56_R)
    extrude(amount=-CUT_EXTRUDE_46_DEPTH, mode=Mode.SUBTRACT)

    # 草图57 → 凸台-拉伸12 (add)
    with BuildSketch(Plane.XZ.offset(-12.045283019)):
        with Locations((18.610377358, 13.5)):
            Rectangle(SKETCH_57_W, SKETCH_57_H)
        with Locations(Location((18.610377358, 14, 0), (0, 0, 90))):
            Circle(SKETCH_57_R, mode=Mode.SUBTRACT)
    extrude(amount=EXTRUDE_12_DEPTH)

    # 草图58 → 切除-拉伸47 (cut)
    with BuildSketch(Plane(origin=(0, -8.054716981, 0), x_dir=(1, 0, 0), z_dir=(0, 1, 0))):
        with Locations((18.610377358, -13.5)):
            Rectangle(SKETCH_58_W, SKETCH_58_H)
    extrude(amount=-CUT_EXTRUDE_47_DEPTH, mode=Mode.SUBTRACT)

    # 草图59 → 凸台-拉伸13 (add)
    with BuildSketch(Plane.ZY.offset(-3.260377358)):
        with Locations((15.75, -7.954716981)):
            Circle(SKETCH_59_R)
    extrude(amount=EXTRUDE_13_DEPTH)

    # 草图60 → 凸台-拉伸14 (add)
    with BuildSketch(Plane(origin=(8.560377358, 0, 0), x_dir=(0, 0, -1), z_dir=(1, 0, 0))):
        with Locations((-22, 12.225283019)):
            Circle(SKETCH_60_R)
    extrude(amount=-EXTRUDE_14_DEPTH)

    # 草图61 → 凸台-拉伸15 (add)
    with BuildSketch(Plane.ZY.offset(2.739622642)):
        Polygon((5, 3.545283019), (15.3, 3.545283019), (15.3, 19.045283019), (26.5, 19.045283019), (26.5, -15.954716981), (5, -15.954716981), align=None)
    extrude(amount=EXTRUDE_15_DEPTH)

    # 草图62 → 切除-拉伸48 (cut, through all)
    with BuildSketch(Plane(origin=(8.560377358, 0, 0), x_dir=(0, 0, -1), z_dir=(1, 0, 0))):
        with Locations(Location((-13.5, -5.854716981, 0), (0, 0, 90))):
            Circle(SKETCH_62_R)
    extrude(amount=-CUT_EXTRUDE_48_DEPTH, mode=Mode.SUBTRACT)

    # 草图65 → 切除-拉伸50 (cut)
    with BuildSketch(Plane.ZY.offset(12.239622642)):
        with Locations((13.5, -5.854716981)):
            Circle(SKETCH_65_R)
        with Locations(Location((13.5, -5.854716981, 0), (0, 0, 90))):
            Circle(SKETCH_65_R_2, mode=Mode.SUBTRACT)
    extrude(amount=-CUT_EXTRUDE_50_DEPTH, mode=Mode.SUBTRACT)

    # 草图66 → 切除-拉伸51 (cut, through all)
    with BuildSketch(Plane(origin=(0, 0, 26.5), x_dir=(-1, 0, 0), z_dir=(0, 0, -1))):
        with Locations((13.239622642, -9.454716981)):
            Circle(SKETCH_66_R)
    extrude(amount=CUT_EXTRUDE_51_DEPTH, mode=Mode.SUBTRACT)

    # 草图67 → 切除-拉伸52 (cut, through all)
    with BuildSketch(Plane(origin=(0, 0, 26.5), x_dir=(-1, 0, 0), z_dir=(0, 0, -1))):
        with Locations((13.239622642, 15.545283019)):
            Circle(SKETCH_67_R)
    extrude(amount=CUT_EXTRUDE_52_DEPTH, mode=Mode.SUBTRACT)

    # 草图68 → 凸台-拉伸16 (add)
    with BuildSketch(Plane(origin=(0, 19.045283019, 0), x_dir=(1, 0, 0), z_dir=(0, 1, 0))):
        Polygon((-2.739622642, -5), (-2.739622642, -15.3), (-12.239622642, -15.3), (-12.239622642, -26.5), (-30.139622642, -26.5), (-30.139622642, -41.5), (28.660377358, -41.5), (28.660377358, -5), align=None)
        with Locations(Location((18.610377358, -14, 0), (0, 0, 270))):
            Circle(SKETCH_68_R, mode=Mode.SUBTRACT)
        with Locations(Location((18.660377358, -31.75, 0), (0, 0, 270))):
            Circle(SKETCH_68_R, mode=Mode.SUBTRACT)
    extrude(amount=EXTRUDE_16_DEPTH)

    # 草图69 → 切除-拉伸53 (cut)
    with BuildSketch(Plane(origin=(0, 22.045283019, 0), x_dir=(1, 0, 0), z_dir=(0, 1, 0))):
        with Locations(Location((18.660377358, -31.75, 0), (0, 0, 270))):
            Circle(SKETCH_69_R)
    extrude(amount=-CUT_EXTRUDE_53_DEPTH, mode=Mode.SUBTRACT)


solid = part.part
